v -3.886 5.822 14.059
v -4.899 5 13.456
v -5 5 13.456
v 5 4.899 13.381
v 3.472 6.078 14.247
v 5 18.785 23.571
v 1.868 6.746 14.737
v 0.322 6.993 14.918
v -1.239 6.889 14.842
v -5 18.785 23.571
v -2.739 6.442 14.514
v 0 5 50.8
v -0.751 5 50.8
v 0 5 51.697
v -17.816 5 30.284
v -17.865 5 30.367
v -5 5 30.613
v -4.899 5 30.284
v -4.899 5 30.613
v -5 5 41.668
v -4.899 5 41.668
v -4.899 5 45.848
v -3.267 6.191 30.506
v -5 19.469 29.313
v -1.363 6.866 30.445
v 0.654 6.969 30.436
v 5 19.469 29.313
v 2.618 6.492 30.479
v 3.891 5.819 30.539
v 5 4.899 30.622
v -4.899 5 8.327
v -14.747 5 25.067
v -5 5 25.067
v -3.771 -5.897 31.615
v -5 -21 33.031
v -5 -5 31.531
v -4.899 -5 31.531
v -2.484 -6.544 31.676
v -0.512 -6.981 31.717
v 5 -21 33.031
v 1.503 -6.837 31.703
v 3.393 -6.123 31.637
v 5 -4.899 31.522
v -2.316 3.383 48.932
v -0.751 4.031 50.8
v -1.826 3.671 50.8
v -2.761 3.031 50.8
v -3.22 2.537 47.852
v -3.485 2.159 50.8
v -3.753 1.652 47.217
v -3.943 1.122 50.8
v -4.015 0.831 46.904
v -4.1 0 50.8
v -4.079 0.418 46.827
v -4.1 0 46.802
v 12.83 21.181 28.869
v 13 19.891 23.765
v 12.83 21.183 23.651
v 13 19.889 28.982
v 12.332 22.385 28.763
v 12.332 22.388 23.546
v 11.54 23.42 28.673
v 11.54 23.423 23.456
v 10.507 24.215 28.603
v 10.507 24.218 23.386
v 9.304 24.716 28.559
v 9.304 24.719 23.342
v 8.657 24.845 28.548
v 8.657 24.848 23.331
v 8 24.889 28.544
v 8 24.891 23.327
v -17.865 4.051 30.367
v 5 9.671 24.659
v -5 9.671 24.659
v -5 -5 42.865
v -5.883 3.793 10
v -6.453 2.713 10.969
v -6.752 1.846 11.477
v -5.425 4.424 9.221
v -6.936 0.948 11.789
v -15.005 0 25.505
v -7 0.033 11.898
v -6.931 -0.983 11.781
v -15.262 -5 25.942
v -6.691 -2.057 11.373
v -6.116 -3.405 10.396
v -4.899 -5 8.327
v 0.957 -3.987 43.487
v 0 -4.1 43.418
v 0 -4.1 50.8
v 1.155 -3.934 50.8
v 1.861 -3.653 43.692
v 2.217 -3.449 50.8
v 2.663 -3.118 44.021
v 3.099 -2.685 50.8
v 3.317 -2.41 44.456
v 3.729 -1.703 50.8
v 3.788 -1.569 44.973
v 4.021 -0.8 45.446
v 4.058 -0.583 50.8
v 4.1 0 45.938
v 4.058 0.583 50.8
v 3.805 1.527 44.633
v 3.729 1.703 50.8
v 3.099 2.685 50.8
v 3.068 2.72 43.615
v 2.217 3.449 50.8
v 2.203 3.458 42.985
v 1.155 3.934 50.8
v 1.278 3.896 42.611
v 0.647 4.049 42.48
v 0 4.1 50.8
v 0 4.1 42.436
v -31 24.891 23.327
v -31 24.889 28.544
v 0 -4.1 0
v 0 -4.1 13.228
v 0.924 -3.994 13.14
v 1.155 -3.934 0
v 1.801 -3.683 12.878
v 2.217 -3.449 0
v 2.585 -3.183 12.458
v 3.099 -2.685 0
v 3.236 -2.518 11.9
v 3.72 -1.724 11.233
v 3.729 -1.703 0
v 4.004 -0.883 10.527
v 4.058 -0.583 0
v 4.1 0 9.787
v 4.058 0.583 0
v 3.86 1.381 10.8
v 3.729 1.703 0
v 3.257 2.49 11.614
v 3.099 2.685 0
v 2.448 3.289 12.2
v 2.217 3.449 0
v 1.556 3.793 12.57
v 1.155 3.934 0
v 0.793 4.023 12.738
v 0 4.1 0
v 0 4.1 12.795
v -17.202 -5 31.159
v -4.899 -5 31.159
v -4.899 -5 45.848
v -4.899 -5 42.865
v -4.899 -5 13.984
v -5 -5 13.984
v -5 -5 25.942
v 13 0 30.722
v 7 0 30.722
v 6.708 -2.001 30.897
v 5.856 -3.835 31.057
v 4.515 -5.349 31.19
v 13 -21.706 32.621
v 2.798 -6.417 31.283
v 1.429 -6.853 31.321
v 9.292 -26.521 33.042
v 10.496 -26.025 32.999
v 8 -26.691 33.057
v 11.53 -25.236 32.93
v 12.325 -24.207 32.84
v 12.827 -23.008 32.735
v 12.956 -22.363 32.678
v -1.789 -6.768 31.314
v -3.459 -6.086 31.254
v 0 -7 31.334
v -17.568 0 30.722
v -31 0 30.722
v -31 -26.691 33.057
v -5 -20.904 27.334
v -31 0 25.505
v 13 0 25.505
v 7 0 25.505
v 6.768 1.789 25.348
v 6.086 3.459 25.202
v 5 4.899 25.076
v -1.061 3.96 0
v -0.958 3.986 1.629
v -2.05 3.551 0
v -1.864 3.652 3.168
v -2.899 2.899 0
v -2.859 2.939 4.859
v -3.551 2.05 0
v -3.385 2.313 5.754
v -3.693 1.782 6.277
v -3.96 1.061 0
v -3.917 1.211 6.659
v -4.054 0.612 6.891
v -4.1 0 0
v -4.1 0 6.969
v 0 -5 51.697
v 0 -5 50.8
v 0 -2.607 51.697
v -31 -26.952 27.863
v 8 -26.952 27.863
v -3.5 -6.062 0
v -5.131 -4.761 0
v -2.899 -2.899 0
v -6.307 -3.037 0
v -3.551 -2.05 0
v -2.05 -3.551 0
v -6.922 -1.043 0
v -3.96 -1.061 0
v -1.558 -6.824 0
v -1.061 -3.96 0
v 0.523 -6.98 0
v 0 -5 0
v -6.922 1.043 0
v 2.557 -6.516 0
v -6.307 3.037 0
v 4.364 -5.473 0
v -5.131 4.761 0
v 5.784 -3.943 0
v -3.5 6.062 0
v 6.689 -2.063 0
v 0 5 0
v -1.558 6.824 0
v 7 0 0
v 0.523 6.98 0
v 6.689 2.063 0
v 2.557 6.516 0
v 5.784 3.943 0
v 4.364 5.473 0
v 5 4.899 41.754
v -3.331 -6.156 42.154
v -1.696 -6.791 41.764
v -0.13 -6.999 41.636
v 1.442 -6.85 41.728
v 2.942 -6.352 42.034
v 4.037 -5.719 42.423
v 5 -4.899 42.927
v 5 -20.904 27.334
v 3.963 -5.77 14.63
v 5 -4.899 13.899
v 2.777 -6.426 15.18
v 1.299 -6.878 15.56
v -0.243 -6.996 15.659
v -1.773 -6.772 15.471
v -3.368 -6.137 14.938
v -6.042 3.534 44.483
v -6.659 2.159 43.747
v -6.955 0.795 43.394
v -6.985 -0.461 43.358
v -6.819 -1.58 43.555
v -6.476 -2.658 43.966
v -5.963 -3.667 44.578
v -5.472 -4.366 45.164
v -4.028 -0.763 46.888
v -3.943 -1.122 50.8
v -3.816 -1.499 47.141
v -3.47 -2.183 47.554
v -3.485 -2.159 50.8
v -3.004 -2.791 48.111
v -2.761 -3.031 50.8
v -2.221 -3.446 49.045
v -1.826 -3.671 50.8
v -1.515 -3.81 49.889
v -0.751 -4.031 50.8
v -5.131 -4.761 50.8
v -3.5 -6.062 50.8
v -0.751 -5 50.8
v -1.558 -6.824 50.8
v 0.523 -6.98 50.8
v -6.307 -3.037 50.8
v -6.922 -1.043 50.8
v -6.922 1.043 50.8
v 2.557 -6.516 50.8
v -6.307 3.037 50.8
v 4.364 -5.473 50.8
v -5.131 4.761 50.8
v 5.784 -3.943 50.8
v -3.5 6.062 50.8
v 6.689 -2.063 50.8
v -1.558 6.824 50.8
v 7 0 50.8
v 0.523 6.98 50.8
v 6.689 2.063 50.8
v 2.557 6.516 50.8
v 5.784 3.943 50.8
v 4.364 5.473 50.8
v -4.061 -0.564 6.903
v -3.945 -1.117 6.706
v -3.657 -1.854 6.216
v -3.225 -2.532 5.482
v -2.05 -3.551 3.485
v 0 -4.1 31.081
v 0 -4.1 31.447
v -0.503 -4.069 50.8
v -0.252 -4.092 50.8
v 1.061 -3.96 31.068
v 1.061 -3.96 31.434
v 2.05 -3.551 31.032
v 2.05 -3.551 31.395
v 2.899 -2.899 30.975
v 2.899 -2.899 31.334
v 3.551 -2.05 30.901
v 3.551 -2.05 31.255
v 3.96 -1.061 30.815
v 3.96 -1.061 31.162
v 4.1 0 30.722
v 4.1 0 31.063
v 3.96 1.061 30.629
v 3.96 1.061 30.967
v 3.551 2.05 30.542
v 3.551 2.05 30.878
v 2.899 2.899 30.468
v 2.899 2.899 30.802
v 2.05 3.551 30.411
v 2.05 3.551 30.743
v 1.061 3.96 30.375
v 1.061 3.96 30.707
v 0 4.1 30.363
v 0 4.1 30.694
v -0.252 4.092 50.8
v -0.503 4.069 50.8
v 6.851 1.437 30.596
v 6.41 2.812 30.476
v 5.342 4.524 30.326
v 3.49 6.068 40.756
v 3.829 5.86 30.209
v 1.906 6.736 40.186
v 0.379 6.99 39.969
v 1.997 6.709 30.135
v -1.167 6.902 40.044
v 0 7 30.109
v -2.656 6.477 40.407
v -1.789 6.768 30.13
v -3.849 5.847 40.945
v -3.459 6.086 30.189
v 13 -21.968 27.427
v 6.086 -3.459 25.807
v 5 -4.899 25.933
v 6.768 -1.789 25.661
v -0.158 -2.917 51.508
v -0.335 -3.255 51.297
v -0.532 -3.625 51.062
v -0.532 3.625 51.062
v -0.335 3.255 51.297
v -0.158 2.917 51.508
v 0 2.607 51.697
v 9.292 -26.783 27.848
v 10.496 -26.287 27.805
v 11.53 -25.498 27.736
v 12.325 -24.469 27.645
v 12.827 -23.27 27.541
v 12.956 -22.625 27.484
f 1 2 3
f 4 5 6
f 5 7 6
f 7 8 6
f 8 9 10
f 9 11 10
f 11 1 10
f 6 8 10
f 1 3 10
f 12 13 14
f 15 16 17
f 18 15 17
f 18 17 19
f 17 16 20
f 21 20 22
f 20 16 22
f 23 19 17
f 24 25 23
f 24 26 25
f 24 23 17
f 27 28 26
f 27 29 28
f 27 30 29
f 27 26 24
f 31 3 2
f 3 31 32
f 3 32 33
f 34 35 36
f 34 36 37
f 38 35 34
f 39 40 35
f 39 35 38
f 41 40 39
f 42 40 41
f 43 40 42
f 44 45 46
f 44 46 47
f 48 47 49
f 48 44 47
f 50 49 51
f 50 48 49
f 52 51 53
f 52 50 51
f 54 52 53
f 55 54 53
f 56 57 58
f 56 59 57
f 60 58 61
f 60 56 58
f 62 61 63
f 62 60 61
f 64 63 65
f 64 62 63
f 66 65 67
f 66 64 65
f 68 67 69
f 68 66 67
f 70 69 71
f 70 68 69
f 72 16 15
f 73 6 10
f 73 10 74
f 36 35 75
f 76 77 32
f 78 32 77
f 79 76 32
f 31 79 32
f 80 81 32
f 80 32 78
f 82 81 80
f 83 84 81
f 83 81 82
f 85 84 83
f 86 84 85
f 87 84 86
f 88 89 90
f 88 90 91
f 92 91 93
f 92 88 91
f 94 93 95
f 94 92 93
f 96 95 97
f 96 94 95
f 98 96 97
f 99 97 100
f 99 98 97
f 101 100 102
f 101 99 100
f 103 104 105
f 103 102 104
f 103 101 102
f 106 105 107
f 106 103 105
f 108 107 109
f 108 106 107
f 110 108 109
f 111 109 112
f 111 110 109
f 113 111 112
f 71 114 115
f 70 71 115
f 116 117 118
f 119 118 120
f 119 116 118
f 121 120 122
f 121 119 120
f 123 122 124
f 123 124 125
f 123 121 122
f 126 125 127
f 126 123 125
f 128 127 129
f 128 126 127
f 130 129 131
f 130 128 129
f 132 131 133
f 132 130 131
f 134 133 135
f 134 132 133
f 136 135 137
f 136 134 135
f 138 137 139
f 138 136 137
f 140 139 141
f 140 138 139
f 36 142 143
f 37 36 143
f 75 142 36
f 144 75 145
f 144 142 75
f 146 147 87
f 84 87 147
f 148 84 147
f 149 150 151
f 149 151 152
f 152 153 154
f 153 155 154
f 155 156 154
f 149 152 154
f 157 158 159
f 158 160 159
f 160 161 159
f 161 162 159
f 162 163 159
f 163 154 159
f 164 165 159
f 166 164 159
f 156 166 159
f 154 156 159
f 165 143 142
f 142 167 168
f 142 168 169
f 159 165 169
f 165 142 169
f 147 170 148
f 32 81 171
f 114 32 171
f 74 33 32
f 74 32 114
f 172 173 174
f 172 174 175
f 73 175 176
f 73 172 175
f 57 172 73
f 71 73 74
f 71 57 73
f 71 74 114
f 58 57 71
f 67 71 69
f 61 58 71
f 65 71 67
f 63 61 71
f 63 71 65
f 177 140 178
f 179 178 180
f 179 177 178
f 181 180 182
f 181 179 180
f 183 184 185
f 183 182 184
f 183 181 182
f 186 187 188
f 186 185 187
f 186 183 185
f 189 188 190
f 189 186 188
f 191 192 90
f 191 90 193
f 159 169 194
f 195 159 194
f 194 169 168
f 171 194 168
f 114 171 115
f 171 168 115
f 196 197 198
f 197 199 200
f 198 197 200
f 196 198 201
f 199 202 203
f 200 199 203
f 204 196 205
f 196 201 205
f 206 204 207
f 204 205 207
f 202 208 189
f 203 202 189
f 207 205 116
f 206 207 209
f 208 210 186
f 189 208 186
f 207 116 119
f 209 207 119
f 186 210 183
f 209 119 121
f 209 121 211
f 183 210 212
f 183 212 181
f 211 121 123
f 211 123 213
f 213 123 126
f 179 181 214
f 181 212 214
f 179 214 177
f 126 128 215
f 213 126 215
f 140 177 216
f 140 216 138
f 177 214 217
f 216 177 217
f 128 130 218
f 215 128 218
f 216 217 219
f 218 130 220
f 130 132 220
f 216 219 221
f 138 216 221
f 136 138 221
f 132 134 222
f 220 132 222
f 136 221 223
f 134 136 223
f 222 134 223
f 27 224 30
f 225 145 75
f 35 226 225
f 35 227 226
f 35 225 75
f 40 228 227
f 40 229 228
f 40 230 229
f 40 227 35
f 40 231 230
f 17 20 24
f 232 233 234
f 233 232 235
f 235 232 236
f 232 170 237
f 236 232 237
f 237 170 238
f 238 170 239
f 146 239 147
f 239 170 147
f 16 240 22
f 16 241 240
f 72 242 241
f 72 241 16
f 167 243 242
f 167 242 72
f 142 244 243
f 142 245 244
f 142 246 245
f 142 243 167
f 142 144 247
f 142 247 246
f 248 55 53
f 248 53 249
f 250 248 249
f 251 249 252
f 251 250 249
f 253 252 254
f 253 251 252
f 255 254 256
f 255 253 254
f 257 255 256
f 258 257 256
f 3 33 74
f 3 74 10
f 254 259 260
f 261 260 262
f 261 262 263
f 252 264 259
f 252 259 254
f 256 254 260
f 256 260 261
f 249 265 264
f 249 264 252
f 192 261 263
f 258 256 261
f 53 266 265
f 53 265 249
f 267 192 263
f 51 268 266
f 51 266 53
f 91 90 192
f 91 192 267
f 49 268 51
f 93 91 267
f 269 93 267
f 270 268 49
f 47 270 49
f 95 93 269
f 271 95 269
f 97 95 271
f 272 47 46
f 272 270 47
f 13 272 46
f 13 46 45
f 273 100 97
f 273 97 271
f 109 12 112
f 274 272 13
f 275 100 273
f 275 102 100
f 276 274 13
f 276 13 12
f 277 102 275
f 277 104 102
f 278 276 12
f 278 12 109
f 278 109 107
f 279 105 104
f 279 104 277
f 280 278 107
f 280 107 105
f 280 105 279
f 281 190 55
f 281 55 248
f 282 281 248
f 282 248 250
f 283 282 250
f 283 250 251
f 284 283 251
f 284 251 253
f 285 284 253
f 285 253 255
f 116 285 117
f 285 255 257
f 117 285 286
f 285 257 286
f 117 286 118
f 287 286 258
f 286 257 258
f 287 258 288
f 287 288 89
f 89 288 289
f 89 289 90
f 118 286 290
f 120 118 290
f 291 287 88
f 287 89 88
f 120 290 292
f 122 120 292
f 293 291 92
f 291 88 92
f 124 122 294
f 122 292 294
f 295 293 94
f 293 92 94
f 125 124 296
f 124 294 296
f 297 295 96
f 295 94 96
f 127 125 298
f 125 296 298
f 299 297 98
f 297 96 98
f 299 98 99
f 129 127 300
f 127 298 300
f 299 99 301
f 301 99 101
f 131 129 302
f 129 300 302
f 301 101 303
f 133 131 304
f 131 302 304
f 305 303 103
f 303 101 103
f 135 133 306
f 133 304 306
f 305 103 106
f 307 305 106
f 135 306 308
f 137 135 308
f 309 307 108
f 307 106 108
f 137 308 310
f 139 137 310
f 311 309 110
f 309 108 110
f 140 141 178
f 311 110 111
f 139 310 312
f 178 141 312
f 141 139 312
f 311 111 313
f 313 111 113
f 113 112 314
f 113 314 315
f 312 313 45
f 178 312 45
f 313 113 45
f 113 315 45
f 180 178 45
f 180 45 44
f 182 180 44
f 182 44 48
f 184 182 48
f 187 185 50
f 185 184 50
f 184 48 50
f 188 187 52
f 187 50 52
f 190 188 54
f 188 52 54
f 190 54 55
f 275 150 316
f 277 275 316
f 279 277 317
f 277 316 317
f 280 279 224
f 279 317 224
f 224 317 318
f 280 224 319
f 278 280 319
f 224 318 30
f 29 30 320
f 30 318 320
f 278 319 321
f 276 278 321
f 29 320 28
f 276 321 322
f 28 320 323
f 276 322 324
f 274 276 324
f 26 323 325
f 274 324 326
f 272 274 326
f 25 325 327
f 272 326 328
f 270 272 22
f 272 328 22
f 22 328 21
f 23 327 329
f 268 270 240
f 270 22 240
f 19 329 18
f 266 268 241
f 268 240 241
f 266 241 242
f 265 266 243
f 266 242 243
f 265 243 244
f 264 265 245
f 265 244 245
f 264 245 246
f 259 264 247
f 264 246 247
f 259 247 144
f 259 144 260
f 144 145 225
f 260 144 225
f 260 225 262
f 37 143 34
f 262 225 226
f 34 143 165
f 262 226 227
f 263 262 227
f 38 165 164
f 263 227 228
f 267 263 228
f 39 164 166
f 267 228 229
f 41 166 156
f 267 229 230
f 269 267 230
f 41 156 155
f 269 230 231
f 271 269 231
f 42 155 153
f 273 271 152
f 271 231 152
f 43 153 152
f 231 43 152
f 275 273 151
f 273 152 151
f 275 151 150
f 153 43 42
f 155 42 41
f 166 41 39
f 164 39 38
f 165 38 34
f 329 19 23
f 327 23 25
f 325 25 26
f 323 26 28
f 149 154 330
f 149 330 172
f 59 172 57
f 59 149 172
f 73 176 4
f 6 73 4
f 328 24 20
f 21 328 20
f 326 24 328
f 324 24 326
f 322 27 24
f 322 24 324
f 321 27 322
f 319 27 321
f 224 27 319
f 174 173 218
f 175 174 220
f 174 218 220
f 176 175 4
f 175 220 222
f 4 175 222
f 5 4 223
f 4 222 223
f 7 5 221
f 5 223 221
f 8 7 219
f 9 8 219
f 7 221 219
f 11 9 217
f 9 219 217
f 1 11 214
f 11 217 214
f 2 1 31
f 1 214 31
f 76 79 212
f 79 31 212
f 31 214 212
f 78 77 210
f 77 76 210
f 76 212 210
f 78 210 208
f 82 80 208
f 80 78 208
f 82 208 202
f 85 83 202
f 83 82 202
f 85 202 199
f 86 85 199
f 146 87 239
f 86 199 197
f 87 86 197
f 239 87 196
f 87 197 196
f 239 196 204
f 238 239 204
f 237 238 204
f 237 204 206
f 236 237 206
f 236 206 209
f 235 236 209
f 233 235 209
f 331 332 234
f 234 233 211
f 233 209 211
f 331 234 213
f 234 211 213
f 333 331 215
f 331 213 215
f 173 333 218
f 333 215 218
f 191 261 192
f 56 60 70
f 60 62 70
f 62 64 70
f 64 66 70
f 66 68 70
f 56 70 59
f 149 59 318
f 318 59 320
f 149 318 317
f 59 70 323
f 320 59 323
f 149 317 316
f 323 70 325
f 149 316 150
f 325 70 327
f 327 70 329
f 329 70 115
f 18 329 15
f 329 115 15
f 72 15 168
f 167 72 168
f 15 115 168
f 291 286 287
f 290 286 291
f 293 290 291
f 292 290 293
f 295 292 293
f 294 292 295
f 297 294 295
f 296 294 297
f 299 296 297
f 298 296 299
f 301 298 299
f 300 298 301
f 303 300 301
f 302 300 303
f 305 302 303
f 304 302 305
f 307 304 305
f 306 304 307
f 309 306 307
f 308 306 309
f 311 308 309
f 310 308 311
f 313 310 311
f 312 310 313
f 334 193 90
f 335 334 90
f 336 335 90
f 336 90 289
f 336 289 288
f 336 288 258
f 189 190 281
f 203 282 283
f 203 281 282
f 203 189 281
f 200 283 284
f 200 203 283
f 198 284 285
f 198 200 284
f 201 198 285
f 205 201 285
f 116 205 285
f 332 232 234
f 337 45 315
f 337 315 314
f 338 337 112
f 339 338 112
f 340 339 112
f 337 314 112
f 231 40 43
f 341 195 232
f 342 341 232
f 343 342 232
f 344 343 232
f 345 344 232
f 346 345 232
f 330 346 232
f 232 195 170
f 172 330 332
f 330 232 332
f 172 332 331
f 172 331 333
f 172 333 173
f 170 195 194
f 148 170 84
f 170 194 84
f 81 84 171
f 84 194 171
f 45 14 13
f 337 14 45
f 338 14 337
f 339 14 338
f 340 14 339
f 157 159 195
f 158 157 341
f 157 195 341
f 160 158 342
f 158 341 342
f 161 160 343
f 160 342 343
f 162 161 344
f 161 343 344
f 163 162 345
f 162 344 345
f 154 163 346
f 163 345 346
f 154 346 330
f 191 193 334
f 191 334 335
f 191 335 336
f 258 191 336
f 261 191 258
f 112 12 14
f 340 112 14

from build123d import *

# Parameters (mm, degrees)
F0_R          = 7
F0_R_2        = 4.1
F1_DEPTH      = 50.8
F3_DEPTH      = 31
F3_DEPTH_BACK = 13
F4_D          = 8
F4_DEPTH      = 50.8
F4_TIP        = 2.4034424761
F5_R          = 5
F7_DEPTH      = 5
F9_DEPTH      = 5
F10_D         = 8.2
F10_DEPTH     = 50.8
F10_TIP       = 2.463528538


with BuildPart() as f1:
    # F0 (on Top) → F1 (new body)
    with BuildSketch(Plane.XY):
        Circle(F0_R)
        Circle(F0_R_2, mode=Mode.SUBTRACT)
    extrude(amount=F1_DEPTH)

    # F2 (on Right) → F3 (join, two sides)
    with BuildSketch(Plane.YZ) as f3_sk:
        Polygon((0, 25.5047638916), (24.8914179106, 23.3270470053), (24.8889016367, 28.5443344728), (0, 30.7218312136), align=None)
        Polygon((-26.9524334618, 27.8627962739), (0, 25.5047638916), (0, 30.7218312136), (-26.6906069858, 33.0569567475), align=None)
    extrude(amount=-F3_DEPTH)
    extrude(f3_sk.sketch, amount=F3_DEPTH_BACK)

    # F4
    with Locations(Plane(origin=(0, 0, 0), x_dir=(1, 0, 0), z_dir=(0, 0, -1))):
        with Locations((0, 0)):
            Hole(F4_D / 2, depth=F4_DEPTH)
            with Locations((0, 0, -(F4_DEPTH + F4_TIP / 2))):  # 118° drill point
                Cone(0, F4_D / 2, F4_TIP, mode=Mode.SUBTRACT)

    # F5
    f5_edges = [f1.edges().sort_by_distance(p)[0] for p in [
        (13, 24.89016, 25.935691),
        (13, -26.82152, 30.459877),
    ]]
    fillet(f5_edges, radius=F5_R)

    # F6 (on Right) → F7 (join, symmetric)
    with BuildSketch(Plane.YZ):
        Polygon((0, 9.7866365686), (18.7852662057, 23.5712174326), (0, 25.8125010878), (-21.4374996722, 27.7812518179), align=None)
        Polygon((-21.0000015795, 33.0312512815), (0, 31.0625005513), (19.4687508047, 29.3125007302), (0, 45.9375008941), align=None)
    extrude(amount=F7_DEPTH, both=True)

    # F8 (on Front) → F9 (join, symmetric)
    with BuildSketch(Plane.XZ):
        Polygon((0, 51.6971051693), (-17.865261063, 30.367417261), (0, 0), align=None)
    extrude(amount=F9_DEPTH, both=True)

    # F10
    with Locations(Plane(origin=(0, 0, 0), x_dir=(1, 0, 0), z_dir=(0, 0, -1))):
        with Locations((0, 0)):
            Hole(F10_D / 2, depth=F10_DEPTH)
            with Locations((0, 0, -(F10_DEPTH + F10_TIP / 2))):  # 118° drill point
                Cone(0, F10_D / 2, F10_TIP, mode=Mode.SUBTRACT)


solid = f1.part
